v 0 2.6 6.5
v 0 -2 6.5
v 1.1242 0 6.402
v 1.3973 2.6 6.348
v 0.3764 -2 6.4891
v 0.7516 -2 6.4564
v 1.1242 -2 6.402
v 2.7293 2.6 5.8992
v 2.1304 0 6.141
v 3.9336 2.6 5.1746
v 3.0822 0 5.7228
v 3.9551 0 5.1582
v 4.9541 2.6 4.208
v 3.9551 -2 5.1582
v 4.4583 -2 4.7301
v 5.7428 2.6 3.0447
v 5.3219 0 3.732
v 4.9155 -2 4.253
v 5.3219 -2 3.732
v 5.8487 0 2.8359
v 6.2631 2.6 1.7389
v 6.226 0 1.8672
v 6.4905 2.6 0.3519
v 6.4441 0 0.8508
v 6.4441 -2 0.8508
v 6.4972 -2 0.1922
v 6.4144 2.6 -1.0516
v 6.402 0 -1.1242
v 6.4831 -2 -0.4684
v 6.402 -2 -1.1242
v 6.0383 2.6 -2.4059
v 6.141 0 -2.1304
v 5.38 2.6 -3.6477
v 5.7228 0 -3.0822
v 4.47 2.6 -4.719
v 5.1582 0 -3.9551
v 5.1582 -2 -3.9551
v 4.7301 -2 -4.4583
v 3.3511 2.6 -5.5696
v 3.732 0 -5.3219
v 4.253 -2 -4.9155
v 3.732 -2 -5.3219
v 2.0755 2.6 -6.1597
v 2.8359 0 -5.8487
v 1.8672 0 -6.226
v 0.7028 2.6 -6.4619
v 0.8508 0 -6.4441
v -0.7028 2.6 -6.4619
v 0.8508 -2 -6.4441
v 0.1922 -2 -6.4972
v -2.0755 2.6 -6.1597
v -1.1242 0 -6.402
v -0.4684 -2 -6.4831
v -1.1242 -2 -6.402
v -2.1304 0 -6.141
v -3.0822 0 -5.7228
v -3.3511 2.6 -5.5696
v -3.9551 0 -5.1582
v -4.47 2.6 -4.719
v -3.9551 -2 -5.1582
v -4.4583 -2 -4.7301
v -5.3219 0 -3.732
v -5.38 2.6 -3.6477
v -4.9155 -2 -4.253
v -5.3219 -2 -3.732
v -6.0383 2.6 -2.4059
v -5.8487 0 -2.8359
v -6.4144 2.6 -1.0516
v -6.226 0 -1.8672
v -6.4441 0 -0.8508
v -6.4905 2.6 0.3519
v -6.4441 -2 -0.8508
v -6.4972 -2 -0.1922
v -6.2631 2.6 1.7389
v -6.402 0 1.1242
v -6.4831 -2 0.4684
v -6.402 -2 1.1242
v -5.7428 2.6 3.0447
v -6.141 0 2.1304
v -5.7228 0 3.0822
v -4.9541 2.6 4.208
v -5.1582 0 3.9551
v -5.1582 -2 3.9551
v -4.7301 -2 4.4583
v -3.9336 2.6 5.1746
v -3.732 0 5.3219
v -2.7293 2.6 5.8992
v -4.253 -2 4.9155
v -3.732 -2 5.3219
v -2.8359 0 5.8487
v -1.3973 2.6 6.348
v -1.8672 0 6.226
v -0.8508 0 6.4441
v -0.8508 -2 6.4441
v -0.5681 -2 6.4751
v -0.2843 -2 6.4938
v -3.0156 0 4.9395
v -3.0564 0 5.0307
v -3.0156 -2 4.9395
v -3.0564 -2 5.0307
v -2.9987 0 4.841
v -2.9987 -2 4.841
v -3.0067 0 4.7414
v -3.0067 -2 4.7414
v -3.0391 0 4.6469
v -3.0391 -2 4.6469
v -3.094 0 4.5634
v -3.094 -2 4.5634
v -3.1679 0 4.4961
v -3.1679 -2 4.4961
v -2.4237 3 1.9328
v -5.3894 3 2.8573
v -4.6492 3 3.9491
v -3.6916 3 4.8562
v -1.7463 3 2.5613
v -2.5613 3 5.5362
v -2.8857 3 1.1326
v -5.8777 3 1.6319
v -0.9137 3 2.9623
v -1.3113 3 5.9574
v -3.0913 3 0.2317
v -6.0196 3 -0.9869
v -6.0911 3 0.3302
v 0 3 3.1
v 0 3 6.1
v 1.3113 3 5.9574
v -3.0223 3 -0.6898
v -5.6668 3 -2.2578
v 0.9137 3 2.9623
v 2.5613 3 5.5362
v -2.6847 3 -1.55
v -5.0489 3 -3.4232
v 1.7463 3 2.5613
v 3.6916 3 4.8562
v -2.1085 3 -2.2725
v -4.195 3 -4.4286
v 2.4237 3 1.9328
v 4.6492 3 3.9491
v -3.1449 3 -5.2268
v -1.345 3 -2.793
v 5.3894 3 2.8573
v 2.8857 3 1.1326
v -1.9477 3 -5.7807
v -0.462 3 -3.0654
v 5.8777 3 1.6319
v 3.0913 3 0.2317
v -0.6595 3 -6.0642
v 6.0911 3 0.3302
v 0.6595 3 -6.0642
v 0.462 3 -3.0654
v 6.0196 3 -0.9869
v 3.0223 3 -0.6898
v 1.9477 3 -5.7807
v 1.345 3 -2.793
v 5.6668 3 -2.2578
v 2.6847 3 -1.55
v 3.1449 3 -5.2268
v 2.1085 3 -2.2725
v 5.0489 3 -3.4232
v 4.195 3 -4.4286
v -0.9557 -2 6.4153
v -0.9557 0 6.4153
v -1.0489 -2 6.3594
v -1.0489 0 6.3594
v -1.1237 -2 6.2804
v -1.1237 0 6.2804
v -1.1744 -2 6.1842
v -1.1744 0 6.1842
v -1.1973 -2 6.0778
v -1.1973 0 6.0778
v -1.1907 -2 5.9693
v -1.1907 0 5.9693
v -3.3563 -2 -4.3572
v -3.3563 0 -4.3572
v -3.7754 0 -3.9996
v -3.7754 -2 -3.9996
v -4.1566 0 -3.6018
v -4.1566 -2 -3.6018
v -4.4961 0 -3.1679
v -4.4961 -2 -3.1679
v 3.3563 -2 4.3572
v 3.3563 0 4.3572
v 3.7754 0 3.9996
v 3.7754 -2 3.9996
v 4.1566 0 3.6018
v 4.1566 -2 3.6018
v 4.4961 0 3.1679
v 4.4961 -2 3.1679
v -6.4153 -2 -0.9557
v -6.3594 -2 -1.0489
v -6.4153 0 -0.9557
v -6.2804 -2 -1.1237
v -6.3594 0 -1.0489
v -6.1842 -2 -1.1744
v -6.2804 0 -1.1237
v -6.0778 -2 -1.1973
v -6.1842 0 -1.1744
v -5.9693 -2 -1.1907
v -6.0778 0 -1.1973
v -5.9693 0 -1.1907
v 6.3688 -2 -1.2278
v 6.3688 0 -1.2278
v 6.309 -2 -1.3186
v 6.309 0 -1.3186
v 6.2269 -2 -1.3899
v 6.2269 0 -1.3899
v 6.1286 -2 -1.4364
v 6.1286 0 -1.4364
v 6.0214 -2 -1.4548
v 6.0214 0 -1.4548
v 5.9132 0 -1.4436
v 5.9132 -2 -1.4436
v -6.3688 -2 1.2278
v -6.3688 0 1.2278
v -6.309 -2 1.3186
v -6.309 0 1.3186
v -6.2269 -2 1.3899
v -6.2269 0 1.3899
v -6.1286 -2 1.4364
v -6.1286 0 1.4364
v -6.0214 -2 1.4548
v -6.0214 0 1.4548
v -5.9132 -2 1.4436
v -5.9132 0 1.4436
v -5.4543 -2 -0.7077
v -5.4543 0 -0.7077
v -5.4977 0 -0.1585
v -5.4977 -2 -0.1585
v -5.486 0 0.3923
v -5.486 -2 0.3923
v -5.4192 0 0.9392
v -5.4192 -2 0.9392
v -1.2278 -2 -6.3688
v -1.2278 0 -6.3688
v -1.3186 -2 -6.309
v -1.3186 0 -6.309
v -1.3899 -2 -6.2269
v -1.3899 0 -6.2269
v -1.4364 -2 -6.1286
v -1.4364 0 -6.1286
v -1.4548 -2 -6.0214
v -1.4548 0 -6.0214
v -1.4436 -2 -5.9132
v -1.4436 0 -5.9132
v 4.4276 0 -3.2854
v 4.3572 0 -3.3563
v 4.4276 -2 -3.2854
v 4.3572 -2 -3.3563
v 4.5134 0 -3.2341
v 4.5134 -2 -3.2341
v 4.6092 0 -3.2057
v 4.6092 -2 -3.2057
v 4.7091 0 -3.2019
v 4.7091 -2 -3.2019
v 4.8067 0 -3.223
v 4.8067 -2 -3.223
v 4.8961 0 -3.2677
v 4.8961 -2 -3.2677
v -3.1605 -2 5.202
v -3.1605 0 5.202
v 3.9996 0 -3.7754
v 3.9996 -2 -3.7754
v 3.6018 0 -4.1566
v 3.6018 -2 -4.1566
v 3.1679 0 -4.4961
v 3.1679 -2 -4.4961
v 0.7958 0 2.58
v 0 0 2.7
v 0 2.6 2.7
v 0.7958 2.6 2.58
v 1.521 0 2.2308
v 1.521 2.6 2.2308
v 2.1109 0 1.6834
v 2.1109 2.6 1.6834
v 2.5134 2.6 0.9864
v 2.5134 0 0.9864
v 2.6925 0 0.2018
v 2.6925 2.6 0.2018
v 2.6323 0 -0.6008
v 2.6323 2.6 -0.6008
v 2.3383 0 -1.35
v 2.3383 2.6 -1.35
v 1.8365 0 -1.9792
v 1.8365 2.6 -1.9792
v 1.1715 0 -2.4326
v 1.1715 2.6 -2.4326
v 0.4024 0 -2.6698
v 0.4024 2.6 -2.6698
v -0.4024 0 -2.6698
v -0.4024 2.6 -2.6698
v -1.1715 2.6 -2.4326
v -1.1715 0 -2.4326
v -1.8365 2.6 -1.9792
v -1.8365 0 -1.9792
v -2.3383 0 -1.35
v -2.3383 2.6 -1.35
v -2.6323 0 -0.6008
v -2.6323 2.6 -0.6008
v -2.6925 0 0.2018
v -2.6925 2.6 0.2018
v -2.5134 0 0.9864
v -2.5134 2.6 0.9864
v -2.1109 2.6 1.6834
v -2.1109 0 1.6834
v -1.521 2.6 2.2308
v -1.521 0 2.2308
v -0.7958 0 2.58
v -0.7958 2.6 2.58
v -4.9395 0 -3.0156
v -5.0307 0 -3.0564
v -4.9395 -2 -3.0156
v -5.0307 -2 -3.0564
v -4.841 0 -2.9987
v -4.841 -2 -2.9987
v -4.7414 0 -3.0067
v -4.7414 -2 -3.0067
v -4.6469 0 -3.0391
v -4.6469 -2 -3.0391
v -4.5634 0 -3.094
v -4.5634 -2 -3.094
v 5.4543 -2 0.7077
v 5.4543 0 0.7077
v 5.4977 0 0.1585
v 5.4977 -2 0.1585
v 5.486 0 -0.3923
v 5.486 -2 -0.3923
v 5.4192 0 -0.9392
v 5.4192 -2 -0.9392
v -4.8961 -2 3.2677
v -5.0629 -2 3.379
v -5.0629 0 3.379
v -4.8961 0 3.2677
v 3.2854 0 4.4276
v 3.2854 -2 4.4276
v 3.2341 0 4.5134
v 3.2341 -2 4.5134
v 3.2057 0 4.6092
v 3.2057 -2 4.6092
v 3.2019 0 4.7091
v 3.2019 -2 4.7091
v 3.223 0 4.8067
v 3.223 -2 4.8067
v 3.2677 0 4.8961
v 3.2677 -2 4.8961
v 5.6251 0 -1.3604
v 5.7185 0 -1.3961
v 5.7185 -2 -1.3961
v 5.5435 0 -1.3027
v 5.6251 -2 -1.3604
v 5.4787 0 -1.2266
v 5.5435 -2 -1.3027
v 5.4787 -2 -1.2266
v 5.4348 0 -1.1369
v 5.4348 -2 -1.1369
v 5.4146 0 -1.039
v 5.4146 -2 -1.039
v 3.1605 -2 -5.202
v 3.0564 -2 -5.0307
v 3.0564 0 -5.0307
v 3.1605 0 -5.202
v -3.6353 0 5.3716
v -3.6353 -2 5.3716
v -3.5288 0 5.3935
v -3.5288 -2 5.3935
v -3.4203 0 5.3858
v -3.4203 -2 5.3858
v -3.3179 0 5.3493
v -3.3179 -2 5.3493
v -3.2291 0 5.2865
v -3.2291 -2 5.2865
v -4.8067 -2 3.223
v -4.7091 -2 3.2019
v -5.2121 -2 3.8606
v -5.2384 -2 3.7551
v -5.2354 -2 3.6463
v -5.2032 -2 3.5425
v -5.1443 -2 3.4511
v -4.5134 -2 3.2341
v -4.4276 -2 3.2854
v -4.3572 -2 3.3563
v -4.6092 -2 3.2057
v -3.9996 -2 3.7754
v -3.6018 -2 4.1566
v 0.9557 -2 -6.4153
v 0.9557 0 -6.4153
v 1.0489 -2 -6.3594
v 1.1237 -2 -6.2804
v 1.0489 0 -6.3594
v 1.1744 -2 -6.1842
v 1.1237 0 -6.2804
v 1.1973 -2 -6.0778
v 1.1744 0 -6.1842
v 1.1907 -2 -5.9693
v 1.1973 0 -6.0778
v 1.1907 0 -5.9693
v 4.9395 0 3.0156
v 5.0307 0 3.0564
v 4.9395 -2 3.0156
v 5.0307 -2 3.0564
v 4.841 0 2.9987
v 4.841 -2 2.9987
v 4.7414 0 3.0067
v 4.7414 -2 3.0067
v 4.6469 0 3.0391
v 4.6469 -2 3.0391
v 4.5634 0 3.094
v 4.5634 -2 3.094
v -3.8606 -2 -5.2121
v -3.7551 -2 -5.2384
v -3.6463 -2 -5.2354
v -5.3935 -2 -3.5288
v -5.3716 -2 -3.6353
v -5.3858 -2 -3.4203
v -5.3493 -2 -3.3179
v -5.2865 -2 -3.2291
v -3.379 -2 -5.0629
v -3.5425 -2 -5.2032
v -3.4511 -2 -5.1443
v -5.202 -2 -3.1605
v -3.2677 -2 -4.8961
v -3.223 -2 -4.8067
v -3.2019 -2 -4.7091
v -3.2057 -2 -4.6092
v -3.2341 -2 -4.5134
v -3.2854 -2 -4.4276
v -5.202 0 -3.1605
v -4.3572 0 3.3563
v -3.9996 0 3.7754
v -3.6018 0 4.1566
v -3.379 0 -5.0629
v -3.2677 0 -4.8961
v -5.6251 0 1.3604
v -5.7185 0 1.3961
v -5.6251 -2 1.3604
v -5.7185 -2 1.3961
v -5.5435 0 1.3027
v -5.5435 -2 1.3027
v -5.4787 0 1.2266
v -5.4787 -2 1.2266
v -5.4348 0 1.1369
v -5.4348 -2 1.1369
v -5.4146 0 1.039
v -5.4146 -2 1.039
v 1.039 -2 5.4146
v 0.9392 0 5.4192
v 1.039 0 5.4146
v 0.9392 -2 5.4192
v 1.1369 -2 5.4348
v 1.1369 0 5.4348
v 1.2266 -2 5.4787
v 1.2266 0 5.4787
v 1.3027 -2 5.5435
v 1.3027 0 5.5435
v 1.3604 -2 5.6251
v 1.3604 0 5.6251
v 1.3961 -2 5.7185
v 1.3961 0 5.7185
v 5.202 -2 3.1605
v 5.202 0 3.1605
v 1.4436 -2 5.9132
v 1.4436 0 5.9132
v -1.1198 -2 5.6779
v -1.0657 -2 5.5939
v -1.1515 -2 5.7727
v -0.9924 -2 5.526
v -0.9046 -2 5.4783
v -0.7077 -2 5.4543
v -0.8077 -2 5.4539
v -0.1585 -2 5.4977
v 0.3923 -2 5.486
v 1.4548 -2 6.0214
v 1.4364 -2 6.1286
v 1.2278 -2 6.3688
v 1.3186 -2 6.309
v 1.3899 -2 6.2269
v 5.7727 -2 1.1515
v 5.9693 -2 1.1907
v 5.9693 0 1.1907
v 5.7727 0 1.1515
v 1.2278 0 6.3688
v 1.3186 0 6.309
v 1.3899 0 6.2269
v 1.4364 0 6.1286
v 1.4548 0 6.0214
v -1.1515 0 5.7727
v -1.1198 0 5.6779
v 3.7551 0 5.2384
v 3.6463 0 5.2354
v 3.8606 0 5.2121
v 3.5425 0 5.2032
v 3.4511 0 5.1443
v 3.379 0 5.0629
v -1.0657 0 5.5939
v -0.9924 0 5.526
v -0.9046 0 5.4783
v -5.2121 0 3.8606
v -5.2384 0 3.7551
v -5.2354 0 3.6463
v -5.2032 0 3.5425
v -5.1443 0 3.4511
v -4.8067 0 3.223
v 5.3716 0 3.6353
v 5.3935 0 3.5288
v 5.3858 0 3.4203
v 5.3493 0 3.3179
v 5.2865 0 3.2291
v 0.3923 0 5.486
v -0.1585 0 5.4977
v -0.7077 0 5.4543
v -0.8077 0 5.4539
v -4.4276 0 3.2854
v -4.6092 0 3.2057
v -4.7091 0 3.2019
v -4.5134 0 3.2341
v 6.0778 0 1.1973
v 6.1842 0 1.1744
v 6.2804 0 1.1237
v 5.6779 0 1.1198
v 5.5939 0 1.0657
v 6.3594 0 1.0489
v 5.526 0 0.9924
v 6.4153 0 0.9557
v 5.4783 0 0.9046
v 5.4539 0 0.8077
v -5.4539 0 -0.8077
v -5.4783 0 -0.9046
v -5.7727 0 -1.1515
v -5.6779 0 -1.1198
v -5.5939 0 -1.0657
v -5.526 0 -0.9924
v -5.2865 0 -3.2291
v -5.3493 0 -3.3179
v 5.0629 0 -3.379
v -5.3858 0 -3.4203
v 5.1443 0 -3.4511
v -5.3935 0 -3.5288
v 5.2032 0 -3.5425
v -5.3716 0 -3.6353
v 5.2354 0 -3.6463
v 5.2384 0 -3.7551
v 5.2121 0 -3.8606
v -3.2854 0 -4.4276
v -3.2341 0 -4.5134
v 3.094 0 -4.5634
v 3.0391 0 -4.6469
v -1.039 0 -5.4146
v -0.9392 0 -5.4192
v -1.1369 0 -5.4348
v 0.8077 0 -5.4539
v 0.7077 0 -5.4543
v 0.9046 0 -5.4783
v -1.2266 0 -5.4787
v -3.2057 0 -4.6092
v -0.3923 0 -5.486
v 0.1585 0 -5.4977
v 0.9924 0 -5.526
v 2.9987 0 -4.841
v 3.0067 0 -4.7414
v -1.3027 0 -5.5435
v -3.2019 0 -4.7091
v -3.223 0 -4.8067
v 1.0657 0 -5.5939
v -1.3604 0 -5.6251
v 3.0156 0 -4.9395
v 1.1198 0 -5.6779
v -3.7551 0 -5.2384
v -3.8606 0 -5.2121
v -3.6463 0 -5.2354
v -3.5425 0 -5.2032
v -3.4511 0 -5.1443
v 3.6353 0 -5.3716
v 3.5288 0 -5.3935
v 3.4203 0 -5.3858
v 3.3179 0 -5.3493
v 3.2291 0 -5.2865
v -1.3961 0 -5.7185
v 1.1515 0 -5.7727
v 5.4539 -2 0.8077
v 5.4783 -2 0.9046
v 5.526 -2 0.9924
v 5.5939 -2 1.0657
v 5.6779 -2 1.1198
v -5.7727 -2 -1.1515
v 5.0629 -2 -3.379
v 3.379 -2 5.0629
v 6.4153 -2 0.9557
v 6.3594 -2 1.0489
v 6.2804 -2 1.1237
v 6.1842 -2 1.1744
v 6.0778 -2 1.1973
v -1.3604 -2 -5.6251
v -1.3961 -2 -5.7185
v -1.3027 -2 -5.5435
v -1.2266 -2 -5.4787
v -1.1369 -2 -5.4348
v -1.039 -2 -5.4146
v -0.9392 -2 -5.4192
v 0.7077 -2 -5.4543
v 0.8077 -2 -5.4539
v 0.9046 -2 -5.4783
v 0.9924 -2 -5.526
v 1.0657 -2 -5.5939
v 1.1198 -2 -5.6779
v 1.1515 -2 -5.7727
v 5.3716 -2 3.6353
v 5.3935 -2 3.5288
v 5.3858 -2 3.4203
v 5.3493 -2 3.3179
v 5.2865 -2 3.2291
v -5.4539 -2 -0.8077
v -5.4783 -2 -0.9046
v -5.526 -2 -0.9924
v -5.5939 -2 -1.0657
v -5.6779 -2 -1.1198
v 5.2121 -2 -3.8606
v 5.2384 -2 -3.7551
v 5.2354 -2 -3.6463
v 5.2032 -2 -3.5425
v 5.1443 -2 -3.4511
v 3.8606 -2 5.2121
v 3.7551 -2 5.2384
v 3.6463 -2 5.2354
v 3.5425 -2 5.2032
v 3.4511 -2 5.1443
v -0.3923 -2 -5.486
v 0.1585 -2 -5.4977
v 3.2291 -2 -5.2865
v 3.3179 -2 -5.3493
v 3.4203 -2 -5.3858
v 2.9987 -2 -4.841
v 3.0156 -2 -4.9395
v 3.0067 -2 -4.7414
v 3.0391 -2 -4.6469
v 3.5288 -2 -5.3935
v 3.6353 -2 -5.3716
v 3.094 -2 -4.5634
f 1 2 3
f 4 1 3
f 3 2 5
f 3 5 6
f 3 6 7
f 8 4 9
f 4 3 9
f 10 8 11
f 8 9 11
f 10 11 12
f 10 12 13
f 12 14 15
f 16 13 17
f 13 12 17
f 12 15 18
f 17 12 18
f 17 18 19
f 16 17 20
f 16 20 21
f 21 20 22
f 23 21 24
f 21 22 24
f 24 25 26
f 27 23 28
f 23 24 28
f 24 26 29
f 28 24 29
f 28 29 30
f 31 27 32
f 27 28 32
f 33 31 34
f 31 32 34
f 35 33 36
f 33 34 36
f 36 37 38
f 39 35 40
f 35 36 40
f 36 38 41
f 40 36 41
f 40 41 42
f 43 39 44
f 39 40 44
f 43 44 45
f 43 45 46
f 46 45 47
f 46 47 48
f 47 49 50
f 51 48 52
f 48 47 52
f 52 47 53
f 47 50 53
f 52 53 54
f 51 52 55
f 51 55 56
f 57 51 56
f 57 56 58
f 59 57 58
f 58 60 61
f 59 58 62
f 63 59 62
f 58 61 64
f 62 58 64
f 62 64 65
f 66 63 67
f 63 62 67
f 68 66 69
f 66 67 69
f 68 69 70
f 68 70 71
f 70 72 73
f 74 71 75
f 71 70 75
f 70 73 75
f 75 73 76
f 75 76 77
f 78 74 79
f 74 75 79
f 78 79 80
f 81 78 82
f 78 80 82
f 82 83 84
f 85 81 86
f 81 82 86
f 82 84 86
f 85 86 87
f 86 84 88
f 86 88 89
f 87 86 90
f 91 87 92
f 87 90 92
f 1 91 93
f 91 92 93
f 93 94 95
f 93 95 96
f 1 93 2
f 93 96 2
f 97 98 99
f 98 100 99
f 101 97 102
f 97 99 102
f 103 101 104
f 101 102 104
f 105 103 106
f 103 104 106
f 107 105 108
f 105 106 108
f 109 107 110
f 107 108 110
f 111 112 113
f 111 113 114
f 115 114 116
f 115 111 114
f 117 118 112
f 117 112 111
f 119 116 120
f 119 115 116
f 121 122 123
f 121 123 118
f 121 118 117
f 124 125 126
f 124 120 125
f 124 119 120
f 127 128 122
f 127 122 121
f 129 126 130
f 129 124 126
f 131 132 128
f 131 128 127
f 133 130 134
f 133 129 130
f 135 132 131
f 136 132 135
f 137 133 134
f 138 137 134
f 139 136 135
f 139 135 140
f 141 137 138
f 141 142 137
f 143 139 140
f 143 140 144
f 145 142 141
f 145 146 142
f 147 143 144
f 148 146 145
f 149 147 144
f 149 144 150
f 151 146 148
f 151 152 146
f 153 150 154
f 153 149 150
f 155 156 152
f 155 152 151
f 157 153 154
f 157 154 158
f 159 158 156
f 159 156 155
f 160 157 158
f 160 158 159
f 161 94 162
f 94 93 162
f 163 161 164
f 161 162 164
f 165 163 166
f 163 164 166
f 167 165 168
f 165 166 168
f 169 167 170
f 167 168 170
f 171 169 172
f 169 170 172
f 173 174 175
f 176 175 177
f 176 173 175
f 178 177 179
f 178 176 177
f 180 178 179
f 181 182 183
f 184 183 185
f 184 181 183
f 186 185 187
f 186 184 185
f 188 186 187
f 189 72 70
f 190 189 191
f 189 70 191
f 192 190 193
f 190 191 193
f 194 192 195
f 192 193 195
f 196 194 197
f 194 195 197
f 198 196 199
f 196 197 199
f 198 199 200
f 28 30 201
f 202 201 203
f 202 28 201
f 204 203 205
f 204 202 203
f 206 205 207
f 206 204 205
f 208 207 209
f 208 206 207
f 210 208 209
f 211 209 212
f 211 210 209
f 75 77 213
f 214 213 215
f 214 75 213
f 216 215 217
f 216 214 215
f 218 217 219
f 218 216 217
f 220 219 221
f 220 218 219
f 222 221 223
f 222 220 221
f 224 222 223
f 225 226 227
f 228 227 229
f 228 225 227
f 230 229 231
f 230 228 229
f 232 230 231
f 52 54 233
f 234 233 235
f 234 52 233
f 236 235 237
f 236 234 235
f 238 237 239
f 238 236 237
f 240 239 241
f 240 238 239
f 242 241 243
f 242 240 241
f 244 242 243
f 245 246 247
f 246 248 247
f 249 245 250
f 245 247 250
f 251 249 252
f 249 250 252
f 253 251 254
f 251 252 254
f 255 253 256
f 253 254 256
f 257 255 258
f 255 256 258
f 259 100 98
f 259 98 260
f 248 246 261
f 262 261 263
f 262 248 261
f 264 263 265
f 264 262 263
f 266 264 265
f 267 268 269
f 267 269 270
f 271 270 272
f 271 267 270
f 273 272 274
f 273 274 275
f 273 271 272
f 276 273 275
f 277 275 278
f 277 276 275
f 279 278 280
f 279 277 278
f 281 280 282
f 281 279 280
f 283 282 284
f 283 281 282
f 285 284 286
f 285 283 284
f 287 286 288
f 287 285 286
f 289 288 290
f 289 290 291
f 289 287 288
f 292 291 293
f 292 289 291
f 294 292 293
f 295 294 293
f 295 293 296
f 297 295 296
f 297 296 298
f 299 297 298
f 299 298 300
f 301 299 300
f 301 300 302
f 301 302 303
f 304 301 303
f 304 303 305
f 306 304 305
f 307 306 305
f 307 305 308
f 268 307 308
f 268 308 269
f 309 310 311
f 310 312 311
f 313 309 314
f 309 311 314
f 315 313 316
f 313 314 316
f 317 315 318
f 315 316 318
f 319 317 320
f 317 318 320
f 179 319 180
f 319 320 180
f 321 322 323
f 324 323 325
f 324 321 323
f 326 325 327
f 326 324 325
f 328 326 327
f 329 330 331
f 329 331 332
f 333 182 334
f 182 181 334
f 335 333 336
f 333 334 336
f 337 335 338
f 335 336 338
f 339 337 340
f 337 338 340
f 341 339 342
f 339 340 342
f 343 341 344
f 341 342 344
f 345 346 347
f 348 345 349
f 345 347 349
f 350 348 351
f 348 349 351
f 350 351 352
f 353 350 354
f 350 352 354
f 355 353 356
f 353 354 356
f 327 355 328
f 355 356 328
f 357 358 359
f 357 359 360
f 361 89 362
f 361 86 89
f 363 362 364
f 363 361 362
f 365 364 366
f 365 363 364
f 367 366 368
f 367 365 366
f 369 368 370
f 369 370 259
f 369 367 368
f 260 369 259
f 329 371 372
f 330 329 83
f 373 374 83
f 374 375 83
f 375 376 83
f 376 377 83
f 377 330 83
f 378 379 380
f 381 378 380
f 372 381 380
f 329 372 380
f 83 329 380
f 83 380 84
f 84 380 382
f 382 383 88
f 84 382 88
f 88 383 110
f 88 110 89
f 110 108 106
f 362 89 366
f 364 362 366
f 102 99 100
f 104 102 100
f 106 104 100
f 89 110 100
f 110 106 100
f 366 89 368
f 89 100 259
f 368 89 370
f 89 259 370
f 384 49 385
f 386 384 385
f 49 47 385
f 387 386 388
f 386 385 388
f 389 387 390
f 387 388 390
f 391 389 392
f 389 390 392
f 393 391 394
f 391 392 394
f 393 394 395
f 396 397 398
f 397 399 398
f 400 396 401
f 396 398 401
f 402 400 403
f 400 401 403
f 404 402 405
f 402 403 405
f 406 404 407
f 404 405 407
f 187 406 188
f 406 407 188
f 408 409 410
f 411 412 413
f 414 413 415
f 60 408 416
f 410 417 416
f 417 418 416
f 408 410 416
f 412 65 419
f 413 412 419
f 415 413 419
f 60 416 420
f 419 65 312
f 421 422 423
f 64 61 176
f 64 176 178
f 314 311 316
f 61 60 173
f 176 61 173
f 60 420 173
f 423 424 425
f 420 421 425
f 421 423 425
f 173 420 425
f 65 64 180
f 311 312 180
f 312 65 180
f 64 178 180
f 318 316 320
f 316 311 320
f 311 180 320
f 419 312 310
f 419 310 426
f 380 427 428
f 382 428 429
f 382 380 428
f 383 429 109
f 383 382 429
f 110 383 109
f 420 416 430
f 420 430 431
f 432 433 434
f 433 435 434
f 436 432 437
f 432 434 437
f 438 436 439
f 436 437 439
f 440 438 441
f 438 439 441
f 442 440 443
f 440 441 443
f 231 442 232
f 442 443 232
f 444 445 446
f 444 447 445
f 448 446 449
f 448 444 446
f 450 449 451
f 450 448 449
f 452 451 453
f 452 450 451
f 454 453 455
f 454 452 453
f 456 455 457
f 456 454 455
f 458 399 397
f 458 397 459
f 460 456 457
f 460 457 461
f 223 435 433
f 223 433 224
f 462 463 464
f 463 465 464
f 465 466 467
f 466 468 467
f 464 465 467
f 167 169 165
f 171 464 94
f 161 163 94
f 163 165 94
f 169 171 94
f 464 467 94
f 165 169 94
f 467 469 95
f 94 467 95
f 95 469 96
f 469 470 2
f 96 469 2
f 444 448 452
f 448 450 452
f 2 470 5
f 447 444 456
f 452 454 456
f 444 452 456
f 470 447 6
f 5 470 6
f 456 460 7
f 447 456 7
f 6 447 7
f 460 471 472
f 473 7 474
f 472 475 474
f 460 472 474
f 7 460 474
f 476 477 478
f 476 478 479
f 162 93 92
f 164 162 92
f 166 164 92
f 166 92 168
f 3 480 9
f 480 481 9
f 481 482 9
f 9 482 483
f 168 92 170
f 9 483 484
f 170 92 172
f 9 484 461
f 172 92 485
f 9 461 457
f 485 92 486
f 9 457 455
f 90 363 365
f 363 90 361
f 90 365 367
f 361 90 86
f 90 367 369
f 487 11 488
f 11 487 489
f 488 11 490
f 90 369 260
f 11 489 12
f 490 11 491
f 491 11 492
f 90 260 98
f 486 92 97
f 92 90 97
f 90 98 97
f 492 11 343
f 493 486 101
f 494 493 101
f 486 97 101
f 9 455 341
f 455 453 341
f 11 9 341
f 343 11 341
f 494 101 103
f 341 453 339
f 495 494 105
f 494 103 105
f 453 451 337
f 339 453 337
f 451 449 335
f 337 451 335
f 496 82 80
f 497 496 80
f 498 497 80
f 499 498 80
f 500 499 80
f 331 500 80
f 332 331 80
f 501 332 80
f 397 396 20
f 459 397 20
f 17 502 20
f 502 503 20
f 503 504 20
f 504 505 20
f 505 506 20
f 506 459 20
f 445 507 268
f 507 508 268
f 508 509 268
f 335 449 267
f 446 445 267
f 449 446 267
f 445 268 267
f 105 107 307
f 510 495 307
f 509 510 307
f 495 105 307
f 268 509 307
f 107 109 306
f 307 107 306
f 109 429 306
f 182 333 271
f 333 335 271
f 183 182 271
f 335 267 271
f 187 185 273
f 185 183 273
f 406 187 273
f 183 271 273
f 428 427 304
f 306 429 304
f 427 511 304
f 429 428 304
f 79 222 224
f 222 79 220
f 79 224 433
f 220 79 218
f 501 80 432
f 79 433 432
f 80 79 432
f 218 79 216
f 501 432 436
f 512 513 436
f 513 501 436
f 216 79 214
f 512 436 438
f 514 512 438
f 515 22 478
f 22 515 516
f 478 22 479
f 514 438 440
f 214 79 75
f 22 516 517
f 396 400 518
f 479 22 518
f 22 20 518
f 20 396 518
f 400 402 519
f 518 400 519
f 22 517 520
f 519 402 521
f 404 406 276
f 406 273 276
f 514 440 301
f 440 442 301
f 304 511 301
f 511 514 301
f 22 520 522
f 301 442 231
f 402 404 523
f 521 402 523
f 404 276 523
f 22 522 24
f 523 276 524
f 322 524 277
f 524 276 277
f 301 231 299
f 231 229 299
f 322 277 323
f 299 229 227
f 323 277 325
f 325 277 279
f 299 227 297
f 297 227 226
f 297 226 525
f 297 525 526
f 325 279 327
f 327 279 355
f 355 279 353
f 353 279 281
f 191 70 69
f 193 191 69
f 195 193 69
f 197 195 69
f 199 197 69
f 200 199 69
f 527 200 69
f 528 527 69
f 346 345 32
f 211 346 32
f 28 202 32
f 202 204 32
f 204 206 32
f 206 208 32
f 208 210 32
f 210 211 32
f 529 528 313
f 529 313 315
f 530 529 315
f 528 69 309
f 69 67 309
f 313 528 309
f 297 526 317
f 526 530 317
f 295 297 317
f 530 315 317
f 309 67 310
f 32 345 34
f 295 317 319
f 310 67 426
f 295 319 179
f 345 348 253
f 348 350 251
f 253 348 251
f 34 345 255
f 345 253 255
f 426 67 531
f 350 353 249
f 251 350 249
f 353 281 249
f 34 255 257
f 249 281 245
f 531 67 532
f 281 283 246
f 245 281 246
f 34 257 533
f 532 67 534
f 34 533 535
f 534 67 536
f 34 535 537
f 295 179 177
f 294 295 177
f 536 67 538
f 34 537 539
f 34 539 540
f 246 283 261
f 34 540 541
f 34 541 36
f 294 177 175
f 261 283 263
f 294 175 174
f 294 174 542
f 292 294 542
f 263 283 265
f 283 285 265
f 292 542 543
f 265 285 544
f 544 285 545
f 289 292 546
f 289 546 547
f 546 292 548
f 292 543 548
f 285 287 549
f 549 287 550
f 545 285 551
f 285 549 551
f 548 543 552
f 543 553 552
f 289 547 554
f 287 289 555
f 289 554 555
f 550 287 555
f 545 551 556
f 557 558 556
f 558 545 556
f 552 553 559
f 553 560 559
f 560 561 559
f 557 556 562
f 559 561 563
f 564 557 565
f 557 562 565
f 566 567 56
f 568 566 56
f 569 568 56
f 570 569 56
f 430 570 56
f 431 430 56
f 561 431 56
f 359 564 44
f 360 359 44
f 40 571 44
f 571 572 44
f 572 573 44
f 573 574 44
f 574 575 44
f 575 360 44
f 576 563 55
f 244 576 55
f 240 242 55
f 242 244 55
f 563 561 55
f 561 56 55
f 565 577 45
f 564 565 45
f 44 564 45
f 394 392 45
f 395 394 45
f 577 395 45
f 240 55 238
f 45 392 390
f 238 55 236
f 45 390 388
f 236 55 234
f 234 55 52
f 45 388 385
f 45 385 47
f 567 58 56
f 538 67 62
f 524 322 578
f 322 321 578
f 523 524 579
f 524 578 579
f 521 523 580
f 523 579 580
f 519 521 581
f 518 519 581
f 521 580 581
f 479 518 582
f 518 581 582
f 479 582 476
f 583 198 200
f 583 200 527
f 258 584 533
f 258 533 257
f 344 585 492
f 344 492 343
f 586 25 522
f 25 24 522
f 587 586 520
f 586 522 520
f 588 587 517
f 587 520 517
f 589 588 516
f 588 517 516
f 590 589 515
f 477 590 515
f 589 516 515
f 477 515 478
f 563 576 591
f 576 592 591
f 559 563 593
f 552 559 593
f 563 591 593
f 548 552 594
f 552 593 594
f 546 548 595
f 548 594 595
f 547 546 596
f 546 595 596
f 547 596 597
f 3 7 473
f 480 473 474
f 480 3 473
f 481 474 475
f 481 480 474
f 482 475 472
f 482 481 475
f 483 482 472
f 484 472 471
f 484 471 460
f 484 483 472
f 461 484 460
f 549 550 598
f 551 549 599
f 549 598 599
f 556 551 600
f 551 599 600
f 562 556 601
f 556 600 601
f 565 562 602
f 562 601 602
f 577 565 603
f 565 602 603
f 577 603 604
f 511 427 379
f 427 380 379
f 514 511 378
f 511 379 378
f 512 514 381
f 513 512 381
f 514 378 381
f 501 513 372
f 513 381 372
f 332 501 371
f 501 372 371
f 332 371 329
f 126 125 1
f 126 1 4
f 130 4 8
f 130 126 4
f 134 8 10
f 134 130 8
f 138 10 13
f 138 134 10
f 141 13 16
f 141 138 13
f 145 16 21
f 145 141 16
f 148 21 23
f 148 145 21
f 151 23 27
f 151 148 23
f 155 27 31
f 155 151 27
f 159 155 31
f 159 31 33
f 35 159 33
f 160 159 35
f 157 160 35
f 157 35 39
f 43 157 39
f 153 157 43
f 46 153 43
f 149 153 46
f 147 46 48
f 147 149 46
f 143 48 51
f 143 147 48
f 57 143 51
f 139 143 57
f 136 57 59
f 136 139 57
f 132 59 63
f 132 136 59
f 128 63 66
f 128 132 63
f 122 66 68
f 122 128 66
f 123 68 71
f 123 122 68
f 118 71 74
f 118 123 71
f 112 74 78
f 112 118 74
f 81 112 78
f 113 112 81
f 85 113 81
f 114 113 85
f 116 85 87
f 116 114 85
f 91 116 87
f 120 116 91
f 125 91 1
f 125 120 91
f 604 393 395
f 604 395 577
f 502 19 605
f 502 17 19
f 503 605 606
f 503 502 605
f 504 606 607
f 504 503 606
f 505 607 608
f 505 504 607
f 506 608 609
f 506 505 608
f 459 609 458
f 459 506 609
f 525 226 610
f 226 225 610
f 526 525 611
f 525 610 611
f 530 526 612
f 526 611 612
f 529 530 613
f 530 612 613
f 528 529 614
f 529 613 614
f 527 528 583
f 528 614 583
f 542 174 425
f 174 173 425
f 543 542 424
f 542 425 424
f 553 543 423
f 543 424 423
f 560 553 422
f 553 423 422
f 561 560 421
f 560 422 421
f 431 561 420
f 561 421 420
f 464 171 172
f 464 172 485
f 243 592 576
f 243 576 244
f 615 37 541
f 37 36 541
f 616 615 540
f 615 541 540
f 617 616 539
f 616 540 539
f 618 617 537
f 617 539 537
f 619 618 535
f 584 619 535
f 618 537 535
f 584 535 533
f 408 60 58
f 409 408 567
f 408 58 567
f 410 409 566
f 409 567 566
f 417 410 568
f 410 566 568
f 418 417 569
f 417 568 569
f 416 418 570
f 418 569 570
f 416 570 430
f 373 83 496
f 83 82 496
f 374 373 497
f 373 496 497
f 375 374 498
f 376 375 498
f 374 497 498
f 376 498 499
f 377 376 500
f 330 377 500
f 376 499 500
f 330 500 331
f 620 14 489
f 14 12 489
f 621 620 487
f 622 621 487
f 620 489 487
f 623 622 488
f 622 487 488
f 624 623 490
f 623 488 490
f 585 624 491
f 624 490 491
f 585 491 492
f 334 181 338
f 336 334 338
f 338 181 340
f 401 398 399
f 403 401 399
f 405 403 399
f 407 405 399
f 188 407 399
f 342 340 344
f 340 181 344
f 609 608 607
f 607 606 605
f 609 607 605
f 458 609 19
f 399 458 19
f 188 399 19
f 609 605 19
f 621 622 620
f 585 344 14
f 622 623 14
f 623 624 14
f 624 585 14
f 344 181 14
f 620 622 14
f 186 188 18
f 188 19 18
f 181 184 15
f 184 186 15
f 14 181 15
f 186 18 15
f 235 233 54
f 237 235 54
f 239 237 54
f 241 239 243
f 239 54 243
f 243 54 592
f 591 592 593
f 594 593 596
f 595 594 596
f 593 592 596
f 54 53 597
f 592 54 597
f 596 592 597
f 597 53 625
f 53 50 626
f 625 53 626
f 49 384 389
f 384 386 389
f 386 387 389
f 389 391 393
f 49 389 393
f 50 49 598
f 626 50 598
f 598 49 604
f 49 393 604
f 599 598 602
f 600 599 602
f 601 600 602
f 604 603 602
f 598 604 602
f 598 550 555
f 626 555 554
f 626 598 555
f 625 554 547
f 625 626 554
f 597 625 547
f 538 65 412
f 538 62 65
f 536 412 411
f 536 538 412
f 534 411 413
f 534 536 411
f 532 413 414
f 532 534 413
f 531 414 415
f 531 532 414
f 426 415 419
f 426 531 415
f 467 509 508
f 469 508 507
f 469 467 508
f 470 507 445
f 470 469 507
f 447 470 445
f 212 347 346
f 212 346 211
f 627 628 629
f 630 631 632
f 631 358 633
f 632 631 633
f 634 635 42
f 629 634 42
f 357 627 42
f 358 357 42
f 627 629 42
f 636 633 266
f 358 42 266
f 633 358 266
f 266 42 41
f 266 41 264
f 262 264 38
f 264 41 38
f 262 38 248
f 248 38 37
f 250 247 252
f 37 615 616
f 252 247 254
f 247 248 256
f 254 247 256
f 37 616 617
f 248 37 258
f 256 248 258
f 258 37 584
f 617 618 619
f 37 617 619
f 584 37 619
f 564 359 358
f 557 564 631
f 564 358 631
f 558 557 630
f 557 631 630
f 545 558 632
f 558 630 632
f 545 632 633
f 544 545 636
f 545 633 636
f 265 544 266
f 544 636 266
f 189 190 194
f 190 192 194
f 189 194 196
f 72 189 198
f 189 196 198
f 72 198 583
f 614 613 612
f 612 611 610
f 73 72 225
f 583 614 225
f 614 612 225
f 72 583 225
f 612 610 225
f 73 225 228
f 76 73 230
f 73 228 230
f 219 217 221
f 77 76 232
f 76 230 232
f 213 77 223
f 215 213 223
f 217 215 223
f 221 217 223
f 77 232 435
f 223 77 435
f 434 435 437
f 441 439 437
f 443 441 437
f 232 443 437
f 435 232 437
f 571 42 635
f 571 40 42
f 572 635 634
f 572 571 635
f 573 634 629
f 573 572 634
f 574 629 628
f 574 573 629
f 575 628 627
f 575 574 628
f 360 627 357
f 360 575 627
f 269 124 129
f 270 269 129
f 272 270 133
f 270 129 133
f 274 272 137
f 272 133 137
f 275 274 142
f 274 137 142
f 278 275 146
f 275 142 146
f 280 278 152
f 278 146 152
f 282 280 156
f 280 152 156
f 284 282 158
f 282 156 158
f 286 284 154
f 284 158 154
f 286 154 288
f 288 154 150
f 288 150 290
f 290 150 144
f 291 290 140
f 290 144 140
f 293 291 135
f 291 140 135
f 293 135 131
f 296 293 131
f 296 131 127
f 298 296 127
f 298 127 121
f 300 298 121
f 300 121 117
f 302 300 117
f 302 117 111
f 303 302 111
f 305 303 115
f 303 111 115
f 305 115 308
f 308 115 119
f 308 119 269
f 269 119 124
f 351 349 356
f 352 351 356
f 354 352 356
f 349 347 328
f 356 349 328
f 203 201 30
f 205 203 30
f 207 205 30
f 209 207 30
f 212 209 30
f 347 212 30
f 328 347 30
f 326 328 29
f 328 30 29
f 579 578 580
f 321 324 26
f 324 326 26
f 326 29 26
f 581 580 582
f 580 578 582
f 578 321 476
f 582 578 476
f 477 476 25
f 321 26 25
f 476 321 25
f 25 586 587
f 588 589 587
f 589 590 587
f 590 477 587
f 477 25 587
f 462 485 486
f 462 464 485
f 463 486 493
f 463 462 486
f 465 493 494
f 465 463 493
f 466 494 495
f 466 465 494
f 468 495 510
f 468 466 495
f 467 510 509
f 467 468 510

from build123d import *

# Parameters (mm, degrees)
SKETCH1_R           = 6.5
SKETCH1_R_2         = 2.7
BOSS_EXTRUDE1_DEPTH = 3
BOSS_EXTRUDE2_START = -2
SKETCH1_3_R         = 6.5
SKETCH1_3_R_2       = 5.5
BOSS_EXTRUDE2_DEPTH = 2
CUT_EXTRUDE1_DEPTH  = 2
CIRPATTERN1_COUNT   = 8
FILLET2_R           = 0.4
CHAMFER1_SIZE       = 0.4


with BuildPart() as part:
    # Sketch1 → Boss-Extrude1 (new body)
    with BuildSketch(Plane(origin=(0, 0, 0), x_dir=(1, 0, 0), z_dir=(0, 1, 0))):
        Circle(SKETCH1_R)
        Circle(SKETCH1_R_2, mode=Mode.SUBTRACT)
    extrude(amount=BOSS_EXTRUDE1_DEPTH)

    # Sketch1<3> → Boss-Extrude2 (add)
    with BuildSketch(Plane(origin=(0, 0, 0), x_dir=(1, 0, 0), z_dir=(0, 1, 0)).offset(BOSS_EXTRUDE2_START)):
        Circle(SKETCH1_3_R)
        Circle(SKETCH1_3_R_2, mode=Mode.SUBTRACT)
    extrude(amount=BOSS_EXTRUDE2_DEPTH)

    # Sketch2 → Cut-Extrude1 (cut)
    with BuildSketch(Plane(origin=(0, -2, 0), x_dir=(-1, 0, 0), z_dir=(0, -1, 0))):
        Polygon((0, 0), (3.374998796, -5.555122242), (3.374998796, -6.374424951), (1.271497758, -6.374424951), align=None)
    cut_extrude1 = extrude(amount=-CUT_EXTRUDE1_DEPTH, mode=Mode.SUBTRACT)

    # CirPattern1: Cut-Extrude1 ×8 about axis
    cirpattern1_axis = Axis((0, 3, 0), (0, -1, 0))
    for i in range(1, CIRPATTERN1_COUNT):
        add(cut_extrude1.rotate(cirpattern1_axis, i * 360 / CIRPATTERN1_COUNT), mode=Mode.SUBTRACT)

    # Fillet2
    fillet2_edges = [part.edges().sort_by_distance(p)[0] for p in [
        (6.314549143, -1, -1.541580072),
        (5.406483796, -1, -3.608314421),
        (3.374998796, -1, -5.555122242),
        (1.271497758, -1, -6.374424951),
        (-1.541580072, -1, -6.314549143),
        (-3.608314421, -1, -5.406483796),
        (-5.555122242, -1, -3.374998796),
        (-6.374424951, -1, -1.271497758),
        (-6.314549143, -1, 1.541580072),
        (-5.406483796, -1, 3.608314421),
        (-3.374998796, -1, 5.555122242),
        (-1.271497758, -1, 6.374424951),
        (1.541580072, -1, 6.314549143),
        (3.608314421, -1, 5.406483796),
        (5.555122242, -1, 3.374998796),
        (6.374424951, -1, 1.271497758),
        (2.855768212, -1, -4.700488051),
        (4.574717058, -1, -3.053189126),
        (5.343080044, -1, -1.304413907),
        (5.393744189, -1, 1.075882719),
        (4.700488051, -1, 2.855768212),
        (3.053189126, -1, 4.574717058),
        (1.304413907, -1, 5.343080044),
        (-1.075882719, -1, 5.393744189),
        (-2.855768212, -1, 4.700488051),
        (-4.574717058, -1, 3.053189126),
        (-5.343080044, -1, 1.304413907),
        (-5.393744189, -1, -1.075882719),
        (-4.700488051, -1, -2.855768212),
        (-3.053189126, -1, -4.574717058),
        (1.075882719, -1, -5.393744189),
        (-1.304413907, -1, -5.343080044),
    ]]
    fillet(fillet2_edges, radius=FILLET2_R)

    # Chamfer1
    chamfer1_edges = [part.edges().sort_by_distance(p)[0] for p in [
        (-6.5, 3, 0),
        (-2.7, 3, 0),
    ]]
    chamfer(chamfer1_edges, length=CHAMFER1_SIZE)


solid = part.part
